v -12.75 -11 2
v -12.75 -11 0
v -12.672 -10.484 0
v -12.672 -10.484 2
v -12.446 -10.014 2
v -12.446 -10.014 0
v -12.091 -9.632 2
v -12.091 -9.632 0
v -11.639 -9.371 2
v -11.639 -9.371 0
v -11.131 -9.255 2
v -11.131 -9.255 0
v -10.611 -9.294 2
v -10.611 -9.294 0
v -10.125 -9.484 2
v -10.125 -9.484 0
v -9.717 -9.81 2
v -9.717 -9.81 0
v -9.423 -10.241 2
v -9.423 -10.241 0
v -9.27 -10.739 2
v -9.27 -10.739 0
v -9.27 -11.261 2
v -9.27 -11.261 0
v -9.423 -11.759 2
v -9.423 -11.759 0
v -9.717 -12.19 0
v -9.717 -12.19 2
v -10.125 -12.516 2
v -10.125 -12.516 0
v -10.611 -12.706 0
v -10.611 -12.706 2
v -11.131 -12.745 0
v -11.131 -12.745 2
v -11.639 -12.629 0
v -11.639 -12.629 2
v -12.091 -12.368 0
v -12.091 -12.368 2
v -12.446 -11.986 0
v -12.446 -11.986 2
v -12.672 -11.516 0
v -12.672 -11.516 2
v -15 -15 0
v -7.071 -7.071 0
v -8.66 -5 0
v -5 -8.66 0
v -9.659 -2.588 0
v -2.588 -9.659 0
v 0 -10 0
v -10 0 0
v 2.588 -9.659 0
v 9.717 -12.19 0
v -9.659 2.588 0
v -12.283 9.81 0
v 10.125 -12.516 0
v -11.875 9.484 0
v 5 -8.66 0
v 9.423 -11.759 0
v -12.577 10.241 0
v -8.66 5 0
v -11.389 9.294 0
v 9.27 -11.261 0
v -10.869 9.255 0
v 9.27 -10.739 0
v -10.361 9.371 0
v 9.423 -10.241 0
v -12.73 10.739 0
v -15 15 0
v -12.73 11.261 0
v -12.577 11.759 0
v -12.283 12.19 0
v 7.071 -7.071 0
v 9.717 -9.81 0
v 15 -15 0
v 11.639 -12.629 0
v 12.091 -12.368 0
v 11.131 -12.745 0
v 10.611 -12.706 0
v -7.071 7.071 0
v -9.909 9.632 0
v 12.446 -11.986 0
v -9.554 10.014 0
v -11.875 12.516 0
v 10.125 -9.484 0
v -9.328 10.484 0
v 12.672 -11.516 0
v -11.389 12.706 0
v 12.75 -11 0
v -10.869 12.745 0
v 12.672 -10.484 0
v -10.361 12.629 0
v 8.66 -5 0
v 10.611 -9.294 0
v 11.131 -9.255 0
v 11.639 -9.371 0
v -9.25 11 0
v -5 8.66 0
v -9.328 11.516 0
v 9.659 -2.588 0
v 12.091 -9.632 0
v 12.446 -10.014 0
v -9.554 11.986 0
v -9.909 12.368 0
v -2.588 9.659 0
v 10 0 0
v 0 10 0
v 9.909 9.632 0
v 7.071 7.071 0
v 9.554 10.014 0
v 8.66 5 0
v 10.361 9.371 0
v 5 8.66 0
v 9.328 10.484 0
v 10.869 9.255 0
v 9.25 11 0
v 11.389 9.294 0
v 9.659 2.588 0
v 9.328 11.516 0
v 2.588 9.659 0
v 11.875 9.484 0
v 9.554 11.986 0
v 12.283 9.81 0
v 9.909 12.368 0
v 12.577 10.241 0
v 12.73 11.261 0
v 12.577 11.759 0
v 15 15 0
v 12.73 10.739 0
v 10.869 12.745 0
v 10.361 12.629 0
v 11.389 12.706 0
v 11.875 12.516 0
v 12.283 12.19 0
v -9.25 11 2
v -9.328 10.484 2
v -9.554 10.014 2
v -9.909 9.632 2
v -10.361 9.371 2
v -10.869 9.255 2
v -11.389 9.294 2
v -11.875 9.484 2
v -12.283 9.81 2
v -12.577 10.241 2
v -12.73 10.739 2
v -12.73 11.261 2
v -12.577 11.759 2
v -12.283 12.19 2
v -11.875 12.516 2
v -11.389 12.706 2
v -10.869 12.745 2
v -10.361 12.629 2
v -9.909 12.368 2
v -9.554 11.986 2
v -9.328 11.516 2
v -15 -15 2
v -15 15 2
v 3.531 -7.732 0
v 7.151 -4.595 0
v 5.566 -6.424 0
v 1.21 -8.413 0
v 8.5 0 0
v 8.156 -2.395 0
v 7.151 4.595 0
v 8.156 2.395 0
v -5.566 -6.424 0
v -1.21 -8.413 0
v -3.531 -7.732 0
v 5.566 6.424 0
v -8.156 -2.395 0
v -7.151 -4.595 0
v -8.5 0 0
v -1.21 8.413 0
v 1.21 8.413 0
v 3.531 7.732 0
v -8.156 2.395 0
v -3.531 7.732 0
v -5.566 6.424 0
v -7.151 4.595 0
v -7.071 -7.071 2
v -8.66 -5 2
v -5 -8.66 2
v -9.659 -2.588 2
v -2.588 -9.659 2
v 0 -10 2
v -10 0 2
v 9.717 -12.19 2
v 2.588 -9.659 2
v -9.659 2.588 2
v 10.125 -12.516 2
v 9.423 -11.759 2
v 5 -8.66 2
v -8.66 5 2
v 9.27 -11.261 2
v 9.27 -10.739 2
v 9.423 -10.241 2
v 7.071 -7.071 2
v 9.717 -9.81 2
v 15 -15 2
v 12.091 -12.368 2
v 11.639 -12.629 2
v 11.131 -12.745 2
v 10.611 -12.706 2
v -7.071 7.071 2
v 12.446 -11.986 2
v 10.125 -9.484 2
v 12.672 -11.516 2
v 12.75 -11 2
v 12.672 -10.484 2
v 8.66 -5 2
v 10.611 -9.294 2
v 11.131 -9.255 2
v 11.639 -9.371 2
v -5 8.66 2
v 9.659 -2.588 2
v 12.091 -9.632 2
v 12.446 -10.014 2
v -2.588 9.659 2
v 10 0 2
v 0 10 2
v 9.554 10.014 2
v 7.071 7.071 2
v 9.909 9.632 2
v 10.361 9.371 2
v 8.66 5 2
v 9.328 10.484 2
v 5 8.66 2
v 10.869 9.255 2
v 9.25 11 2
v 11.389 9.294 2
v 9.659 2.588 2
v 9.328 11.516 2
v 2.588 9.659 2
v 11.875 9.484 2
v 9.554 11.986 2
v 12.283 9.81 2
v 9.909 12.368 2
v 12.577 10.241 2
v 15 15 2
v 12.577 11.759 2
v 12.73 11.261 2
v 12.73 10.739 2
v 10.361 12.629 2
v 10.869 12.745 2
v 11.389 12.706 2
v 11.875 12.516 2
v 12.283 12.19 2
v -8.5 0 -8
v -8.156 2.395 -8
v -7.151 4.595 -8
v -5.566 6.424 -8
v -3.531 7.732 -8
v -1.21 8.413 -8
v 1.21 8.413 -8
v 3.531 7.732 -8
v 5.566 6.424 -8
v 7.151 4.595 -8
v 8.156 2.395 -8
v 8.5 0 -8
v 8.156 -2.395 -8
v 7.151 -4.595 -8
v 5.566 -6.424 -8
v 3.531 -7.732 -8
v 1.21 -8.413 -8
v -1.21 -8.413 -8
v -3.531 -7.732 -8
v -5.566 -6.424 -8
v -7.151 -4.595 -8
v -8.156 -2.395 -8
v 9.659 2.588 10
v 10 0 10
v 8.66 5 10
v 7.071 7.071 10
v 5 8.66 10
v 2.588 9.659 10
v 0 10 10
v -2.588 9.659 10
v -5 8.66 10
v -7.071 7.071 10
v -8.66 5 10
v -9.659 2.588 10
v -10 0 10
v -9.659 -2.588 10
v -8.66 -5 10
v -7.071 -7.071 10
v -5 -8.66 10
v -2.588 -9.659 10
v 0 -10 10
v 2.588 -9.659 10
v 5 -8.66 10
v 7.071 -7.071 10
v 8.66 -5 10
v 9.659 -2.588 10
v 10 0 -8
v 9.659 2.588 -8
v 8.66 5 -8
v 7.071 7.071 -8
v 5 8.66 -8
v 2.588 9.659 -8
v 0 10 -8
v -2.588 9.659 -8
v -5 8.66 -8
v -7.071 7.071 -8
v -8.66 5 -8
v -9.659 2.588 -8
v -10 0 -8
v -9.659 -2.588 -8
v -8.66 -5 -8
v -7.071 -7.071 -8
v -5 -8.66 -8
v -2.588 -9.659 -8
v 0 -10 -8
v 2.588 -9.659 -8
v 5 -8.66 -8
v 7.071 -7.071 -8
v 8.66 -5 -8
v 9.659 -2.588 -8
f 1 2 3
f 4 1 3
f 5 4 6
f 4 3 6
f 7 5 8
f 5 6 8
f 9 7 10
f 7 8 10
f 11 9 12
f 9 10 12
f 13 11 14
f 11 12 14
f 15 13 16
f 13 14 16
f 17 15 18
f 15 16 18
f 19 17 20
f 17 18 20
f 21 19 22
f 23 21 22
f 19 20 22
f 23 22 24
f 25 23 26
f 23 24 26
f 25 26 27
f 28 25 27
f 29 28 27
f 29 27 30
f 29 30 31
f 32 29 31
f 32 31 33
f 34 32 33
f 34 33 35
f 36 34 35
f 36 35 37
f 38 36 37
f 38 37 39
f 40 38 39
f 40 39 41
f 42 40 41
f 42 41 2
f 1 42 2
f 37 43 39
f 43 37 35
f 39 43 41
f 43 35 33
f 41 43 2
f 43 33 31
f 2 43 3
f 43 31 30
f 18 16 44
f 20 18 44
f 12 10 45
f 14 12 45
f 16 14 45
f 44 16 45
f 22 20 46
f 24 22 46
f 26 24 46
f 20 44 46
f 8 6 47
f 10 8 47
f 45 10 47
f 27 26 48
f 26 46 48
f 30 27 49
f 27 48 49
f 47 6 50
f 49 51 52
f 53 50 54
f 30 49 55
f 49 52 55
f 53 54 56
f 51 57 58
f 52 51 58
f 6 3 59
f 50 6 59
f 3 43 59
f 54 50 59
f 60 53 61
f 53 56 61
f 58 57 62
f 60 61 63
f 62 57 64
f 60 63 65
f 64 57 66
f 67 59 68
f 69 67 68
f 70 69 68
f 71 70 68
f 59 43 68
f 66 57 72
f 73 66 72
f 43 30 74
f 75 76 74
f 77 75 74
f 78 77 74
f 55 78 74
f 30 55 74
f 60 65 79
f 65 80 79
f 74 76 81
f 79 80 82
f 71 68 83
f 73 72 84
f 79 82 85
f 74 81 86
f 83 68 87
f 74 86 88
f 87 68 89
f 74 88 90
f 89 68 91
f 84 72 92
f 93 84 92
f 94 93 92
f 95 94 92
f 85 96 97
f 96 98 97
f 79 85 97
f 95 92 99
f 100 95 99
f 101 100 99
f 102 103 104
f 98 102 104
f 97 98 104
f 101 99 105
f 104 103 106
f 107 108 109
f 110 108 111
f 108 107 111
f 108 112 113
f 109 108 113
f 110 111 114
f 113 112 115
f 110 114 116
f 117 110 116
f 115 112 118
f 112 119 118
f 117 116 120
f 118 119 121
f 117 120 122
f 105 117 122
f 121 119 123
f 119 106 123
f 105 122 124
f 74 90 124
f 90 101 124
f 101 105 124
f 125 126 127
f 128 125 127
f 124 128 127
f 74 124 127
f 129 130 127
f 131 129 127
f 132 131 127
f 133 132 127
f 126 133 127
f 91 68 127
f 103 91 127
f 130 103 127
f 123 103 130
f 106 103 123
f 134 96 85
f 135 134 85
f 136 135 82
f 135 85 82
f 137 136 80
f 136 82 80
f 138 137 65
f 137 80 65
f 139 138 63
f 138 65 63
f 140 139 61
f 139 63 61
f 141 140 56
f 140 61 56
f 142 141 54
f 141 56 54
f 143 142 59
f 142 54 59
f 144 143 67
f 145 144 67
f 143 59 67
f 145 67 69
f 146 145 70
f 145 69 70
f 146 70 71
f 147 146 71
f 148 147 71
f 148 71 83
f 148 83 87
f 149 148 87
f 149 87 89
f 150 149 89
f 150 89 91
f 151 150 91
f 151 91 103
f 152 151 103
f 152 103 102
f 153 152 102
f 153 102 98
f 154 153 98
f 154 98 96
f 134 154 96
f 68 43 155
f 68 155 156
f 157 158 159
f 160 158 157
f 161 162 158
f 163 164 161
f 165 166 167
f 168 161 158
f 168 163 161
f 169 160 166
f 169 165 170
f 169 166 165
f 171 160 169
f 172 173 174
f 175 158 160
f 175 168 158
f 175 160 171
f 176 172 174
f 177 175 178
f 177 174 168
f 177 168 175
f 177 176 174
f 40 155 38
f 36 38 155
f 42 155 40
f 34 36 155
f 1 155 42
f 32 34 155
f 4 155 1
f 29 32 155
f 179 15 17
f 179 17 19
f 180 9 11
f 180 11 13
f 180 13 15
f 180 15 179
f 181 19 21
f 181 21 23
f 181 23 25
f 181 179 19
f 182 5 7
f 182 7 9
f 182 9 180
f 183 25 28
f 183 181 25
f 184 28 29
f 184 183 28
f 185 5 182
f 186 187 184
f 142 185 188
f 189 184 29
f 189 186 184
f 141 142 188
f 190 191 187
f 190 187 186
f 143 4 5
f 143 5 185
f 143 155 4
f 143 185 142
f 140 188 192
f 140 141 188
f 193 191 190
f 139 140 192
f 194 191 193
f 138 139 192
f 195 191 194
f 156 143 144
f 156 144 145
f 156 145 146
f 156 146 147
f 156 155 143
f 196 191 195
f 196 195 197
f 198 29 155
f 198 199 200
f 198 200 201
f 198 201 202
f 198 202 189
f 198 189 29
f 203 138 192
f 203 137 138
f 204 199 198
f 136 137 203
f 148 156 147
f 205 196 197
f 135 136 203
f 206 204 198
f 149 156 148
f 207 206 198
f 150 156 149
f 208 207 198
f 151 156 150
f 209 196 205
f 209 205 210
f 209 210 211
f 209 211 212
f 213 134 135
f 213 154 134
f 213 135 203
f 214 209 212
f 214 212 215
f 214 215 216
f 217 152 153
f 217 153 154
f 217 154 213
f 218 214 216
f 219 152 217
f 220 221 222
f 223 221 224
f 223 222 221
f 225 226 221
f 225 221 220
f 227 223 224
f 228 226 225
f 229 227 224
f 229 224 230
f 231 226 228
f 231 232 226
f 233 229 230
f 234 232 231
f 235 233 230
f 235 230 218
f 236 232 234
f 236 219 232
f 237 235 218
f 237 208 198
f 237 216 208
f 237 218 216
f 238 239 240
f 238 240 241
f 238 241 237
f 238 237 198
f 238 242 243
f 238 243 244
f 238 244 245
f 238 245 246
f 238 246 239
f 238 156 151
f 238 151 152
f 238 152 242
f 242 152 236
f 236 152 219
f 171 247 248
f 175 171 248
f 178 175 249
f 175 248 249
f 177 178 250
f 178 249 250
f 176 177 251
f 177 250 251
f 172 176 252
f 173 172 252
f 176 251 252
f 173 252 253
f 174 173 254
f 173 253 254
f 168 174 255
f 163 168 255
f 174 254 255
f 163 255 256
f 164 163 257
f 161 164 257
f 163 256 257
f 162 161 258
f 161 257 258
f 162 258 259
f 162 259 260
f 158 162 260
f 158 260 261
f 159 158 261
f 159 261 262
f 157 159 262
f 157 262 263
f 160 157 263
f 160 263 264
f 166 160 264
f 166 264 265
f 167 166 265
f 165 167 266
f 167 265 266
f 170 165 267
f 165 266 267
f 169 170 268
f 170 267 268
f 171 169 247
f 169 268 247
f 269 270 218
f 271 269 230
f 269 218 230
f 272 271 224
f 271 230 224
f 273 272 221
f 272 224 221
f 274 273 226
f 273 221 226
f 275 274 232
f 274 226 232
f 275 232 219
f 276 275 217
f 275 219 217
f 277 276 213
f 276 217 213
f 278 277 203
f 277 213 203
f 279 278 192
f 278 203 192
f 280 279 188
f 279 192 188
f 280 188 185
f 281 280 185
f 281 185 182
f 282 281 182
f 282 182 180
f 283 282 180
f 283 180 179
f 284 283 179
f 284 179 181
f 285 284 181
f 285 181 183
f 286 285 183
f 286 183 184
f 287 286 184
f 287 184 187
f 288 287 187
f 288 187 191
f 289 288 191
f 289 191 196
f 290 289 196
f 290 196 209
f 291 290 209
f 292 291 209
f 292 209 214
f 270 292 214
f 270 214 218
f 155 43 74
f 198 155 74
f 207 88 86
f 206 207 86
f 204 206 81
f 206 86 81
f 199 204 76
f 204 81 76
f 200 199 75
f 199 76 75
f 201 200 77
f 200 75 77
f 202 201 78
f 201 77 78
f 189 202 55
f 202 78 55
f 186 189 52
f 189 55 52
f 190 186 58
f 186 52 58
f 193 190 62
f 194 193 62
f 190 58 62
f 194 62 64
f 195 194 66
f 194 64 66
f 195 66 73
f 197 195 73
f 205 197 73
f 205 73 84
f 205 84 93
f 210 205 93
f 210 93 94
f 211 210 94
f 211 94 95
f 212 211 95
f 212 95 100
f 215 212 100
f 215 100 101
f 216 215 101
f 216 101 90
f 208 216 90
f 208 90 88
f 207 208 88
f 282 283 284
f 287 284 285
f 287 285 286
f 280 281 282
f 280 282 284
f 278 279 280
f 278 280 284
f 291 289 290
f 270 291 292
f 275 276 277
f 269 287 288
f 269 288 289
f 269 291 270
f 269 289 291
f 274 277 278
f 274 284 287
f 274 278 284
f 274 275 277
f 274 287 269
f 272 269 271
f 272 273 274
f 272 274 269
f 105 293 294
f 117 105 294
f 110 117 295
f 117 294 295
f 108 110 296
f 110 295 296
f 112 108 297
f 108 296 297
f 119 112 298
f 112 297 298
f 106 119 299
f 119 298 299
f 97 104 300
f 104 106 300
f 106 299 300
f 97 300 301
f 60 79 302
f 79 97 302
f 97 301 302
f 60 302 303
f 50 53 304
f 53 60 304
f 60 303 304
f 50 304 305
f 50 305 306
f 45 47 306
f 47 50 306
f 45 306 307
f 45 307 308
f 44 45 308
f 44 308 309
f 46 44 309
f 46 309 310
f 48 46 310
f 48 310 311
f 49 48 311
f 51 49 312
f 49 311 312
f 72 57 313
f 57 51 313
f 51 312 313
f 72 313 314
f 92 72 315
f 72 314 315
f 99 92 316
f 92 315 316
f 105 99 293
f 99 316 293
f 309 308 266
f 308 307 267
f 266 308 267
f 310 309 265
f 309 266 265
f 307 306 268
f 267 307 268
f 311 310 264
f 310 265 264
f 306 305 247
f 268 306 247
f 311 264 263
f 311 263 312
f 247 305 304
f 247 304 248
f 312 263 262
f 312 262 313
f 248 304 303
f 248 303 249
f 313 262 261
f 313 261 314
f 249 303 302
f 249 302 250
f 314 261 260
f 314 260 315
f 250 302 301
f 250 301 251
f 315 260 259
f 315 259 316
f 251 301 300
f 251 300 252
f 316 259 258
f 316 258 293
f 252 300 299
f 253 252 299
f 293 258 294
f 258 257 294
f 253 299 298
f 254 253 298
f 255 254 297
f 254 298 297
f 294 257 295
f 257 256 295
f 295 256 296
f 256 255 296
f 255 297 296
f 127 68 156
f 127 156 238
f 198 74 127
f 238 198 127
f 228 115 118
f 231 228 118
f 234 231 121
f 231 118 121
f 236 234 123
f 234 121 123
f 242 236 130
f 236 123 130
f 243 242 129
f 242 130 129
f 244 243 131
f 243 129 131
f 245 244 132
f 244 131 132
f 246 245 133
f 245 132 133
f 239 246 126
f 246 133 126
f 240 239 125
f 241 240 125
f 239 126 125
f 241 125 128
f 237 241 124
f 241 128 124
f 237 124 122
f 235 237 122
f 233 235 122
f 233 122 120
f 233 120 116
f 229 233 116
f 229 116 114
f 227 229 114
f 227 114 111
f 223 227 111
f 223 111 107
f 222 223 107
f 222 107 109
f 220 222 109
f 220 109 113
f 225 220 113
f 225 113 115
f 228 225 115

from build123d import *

# Parameters (mm, degrees)
SKETCH_1_W           = 30
SKETCH_1_H           = 30
EXTRUDE_1_DEPTH      = 2
EXTRUDE_2_DEPTH      = 8
EXTRUDE_2_DEPTH_BACK = 10
SKETCH_2_R           = 10
SKETCH_3_R           = 8.5
CUT_EXTRUDE_1_DEPTH  = 8
SKETCH_4_R           = 1.75
CUT_EXTRUDE_2_DEPTH  = 8


with BuildPart() as part:
    # 草图1 → 凸台-拉伸1 (new body)
    with BuildSketch(Plane.XY):
        Rectangle(SKETCH_1_W, SKETCH_1_H)
    extrude(amount=EXTRUDE_1_DEPTH)

    # 草图2 → 凸台-拉伸2 (add, two sides: drawn at the far end of the back side and taken through both)
    with BuildSketch(Plane.XY.offset(2).offset(-EXTRUDE_2_DEPTH_BACK)):
        Circle(SKETCH_2_R)
    extrude(amount=EXTRUDE_2_DEPTH + EXTRUDE_2_DEPTH_BACK)

    # 草图3 → 切除-拉伸1 (cut)
    with BuildSketch(Plane(origin=(0, 0, -8), x_dir=(-1, 0, 0), z_dir=(0, 0, -1))):
        Circle(SKETCH_3_R)
    extrude(amount=-CUT_EXTRUDE_1_DEPTH, mode=Mode.SUBTRACT)

    # 草图4 → 切除-拉伸2 (cut)
    with BuildSketch(Plane(origin=(0, 0, 0), x_dir=(-1, 0, 0), z_dir=(0, 0, -1))):
        with Locations((-11, 11)):
            Circle(SKETCH_4_R)
        with Locations(Location((11, 11, 0), (0, 0, 180))):
            Circle(SKETCH_4_R)
        with Locations((11, -11)):
            Circle(SKETCH_4_R)
        with Locations(Location((-11, -11, 0), (0, 0, 180))):
            Circle(SKETCH_4_R)
    extrude(amount=-CUT_EXTRUDE_2_DEPTH, mode=Mode.SUBTRACT)


solid = part.part
